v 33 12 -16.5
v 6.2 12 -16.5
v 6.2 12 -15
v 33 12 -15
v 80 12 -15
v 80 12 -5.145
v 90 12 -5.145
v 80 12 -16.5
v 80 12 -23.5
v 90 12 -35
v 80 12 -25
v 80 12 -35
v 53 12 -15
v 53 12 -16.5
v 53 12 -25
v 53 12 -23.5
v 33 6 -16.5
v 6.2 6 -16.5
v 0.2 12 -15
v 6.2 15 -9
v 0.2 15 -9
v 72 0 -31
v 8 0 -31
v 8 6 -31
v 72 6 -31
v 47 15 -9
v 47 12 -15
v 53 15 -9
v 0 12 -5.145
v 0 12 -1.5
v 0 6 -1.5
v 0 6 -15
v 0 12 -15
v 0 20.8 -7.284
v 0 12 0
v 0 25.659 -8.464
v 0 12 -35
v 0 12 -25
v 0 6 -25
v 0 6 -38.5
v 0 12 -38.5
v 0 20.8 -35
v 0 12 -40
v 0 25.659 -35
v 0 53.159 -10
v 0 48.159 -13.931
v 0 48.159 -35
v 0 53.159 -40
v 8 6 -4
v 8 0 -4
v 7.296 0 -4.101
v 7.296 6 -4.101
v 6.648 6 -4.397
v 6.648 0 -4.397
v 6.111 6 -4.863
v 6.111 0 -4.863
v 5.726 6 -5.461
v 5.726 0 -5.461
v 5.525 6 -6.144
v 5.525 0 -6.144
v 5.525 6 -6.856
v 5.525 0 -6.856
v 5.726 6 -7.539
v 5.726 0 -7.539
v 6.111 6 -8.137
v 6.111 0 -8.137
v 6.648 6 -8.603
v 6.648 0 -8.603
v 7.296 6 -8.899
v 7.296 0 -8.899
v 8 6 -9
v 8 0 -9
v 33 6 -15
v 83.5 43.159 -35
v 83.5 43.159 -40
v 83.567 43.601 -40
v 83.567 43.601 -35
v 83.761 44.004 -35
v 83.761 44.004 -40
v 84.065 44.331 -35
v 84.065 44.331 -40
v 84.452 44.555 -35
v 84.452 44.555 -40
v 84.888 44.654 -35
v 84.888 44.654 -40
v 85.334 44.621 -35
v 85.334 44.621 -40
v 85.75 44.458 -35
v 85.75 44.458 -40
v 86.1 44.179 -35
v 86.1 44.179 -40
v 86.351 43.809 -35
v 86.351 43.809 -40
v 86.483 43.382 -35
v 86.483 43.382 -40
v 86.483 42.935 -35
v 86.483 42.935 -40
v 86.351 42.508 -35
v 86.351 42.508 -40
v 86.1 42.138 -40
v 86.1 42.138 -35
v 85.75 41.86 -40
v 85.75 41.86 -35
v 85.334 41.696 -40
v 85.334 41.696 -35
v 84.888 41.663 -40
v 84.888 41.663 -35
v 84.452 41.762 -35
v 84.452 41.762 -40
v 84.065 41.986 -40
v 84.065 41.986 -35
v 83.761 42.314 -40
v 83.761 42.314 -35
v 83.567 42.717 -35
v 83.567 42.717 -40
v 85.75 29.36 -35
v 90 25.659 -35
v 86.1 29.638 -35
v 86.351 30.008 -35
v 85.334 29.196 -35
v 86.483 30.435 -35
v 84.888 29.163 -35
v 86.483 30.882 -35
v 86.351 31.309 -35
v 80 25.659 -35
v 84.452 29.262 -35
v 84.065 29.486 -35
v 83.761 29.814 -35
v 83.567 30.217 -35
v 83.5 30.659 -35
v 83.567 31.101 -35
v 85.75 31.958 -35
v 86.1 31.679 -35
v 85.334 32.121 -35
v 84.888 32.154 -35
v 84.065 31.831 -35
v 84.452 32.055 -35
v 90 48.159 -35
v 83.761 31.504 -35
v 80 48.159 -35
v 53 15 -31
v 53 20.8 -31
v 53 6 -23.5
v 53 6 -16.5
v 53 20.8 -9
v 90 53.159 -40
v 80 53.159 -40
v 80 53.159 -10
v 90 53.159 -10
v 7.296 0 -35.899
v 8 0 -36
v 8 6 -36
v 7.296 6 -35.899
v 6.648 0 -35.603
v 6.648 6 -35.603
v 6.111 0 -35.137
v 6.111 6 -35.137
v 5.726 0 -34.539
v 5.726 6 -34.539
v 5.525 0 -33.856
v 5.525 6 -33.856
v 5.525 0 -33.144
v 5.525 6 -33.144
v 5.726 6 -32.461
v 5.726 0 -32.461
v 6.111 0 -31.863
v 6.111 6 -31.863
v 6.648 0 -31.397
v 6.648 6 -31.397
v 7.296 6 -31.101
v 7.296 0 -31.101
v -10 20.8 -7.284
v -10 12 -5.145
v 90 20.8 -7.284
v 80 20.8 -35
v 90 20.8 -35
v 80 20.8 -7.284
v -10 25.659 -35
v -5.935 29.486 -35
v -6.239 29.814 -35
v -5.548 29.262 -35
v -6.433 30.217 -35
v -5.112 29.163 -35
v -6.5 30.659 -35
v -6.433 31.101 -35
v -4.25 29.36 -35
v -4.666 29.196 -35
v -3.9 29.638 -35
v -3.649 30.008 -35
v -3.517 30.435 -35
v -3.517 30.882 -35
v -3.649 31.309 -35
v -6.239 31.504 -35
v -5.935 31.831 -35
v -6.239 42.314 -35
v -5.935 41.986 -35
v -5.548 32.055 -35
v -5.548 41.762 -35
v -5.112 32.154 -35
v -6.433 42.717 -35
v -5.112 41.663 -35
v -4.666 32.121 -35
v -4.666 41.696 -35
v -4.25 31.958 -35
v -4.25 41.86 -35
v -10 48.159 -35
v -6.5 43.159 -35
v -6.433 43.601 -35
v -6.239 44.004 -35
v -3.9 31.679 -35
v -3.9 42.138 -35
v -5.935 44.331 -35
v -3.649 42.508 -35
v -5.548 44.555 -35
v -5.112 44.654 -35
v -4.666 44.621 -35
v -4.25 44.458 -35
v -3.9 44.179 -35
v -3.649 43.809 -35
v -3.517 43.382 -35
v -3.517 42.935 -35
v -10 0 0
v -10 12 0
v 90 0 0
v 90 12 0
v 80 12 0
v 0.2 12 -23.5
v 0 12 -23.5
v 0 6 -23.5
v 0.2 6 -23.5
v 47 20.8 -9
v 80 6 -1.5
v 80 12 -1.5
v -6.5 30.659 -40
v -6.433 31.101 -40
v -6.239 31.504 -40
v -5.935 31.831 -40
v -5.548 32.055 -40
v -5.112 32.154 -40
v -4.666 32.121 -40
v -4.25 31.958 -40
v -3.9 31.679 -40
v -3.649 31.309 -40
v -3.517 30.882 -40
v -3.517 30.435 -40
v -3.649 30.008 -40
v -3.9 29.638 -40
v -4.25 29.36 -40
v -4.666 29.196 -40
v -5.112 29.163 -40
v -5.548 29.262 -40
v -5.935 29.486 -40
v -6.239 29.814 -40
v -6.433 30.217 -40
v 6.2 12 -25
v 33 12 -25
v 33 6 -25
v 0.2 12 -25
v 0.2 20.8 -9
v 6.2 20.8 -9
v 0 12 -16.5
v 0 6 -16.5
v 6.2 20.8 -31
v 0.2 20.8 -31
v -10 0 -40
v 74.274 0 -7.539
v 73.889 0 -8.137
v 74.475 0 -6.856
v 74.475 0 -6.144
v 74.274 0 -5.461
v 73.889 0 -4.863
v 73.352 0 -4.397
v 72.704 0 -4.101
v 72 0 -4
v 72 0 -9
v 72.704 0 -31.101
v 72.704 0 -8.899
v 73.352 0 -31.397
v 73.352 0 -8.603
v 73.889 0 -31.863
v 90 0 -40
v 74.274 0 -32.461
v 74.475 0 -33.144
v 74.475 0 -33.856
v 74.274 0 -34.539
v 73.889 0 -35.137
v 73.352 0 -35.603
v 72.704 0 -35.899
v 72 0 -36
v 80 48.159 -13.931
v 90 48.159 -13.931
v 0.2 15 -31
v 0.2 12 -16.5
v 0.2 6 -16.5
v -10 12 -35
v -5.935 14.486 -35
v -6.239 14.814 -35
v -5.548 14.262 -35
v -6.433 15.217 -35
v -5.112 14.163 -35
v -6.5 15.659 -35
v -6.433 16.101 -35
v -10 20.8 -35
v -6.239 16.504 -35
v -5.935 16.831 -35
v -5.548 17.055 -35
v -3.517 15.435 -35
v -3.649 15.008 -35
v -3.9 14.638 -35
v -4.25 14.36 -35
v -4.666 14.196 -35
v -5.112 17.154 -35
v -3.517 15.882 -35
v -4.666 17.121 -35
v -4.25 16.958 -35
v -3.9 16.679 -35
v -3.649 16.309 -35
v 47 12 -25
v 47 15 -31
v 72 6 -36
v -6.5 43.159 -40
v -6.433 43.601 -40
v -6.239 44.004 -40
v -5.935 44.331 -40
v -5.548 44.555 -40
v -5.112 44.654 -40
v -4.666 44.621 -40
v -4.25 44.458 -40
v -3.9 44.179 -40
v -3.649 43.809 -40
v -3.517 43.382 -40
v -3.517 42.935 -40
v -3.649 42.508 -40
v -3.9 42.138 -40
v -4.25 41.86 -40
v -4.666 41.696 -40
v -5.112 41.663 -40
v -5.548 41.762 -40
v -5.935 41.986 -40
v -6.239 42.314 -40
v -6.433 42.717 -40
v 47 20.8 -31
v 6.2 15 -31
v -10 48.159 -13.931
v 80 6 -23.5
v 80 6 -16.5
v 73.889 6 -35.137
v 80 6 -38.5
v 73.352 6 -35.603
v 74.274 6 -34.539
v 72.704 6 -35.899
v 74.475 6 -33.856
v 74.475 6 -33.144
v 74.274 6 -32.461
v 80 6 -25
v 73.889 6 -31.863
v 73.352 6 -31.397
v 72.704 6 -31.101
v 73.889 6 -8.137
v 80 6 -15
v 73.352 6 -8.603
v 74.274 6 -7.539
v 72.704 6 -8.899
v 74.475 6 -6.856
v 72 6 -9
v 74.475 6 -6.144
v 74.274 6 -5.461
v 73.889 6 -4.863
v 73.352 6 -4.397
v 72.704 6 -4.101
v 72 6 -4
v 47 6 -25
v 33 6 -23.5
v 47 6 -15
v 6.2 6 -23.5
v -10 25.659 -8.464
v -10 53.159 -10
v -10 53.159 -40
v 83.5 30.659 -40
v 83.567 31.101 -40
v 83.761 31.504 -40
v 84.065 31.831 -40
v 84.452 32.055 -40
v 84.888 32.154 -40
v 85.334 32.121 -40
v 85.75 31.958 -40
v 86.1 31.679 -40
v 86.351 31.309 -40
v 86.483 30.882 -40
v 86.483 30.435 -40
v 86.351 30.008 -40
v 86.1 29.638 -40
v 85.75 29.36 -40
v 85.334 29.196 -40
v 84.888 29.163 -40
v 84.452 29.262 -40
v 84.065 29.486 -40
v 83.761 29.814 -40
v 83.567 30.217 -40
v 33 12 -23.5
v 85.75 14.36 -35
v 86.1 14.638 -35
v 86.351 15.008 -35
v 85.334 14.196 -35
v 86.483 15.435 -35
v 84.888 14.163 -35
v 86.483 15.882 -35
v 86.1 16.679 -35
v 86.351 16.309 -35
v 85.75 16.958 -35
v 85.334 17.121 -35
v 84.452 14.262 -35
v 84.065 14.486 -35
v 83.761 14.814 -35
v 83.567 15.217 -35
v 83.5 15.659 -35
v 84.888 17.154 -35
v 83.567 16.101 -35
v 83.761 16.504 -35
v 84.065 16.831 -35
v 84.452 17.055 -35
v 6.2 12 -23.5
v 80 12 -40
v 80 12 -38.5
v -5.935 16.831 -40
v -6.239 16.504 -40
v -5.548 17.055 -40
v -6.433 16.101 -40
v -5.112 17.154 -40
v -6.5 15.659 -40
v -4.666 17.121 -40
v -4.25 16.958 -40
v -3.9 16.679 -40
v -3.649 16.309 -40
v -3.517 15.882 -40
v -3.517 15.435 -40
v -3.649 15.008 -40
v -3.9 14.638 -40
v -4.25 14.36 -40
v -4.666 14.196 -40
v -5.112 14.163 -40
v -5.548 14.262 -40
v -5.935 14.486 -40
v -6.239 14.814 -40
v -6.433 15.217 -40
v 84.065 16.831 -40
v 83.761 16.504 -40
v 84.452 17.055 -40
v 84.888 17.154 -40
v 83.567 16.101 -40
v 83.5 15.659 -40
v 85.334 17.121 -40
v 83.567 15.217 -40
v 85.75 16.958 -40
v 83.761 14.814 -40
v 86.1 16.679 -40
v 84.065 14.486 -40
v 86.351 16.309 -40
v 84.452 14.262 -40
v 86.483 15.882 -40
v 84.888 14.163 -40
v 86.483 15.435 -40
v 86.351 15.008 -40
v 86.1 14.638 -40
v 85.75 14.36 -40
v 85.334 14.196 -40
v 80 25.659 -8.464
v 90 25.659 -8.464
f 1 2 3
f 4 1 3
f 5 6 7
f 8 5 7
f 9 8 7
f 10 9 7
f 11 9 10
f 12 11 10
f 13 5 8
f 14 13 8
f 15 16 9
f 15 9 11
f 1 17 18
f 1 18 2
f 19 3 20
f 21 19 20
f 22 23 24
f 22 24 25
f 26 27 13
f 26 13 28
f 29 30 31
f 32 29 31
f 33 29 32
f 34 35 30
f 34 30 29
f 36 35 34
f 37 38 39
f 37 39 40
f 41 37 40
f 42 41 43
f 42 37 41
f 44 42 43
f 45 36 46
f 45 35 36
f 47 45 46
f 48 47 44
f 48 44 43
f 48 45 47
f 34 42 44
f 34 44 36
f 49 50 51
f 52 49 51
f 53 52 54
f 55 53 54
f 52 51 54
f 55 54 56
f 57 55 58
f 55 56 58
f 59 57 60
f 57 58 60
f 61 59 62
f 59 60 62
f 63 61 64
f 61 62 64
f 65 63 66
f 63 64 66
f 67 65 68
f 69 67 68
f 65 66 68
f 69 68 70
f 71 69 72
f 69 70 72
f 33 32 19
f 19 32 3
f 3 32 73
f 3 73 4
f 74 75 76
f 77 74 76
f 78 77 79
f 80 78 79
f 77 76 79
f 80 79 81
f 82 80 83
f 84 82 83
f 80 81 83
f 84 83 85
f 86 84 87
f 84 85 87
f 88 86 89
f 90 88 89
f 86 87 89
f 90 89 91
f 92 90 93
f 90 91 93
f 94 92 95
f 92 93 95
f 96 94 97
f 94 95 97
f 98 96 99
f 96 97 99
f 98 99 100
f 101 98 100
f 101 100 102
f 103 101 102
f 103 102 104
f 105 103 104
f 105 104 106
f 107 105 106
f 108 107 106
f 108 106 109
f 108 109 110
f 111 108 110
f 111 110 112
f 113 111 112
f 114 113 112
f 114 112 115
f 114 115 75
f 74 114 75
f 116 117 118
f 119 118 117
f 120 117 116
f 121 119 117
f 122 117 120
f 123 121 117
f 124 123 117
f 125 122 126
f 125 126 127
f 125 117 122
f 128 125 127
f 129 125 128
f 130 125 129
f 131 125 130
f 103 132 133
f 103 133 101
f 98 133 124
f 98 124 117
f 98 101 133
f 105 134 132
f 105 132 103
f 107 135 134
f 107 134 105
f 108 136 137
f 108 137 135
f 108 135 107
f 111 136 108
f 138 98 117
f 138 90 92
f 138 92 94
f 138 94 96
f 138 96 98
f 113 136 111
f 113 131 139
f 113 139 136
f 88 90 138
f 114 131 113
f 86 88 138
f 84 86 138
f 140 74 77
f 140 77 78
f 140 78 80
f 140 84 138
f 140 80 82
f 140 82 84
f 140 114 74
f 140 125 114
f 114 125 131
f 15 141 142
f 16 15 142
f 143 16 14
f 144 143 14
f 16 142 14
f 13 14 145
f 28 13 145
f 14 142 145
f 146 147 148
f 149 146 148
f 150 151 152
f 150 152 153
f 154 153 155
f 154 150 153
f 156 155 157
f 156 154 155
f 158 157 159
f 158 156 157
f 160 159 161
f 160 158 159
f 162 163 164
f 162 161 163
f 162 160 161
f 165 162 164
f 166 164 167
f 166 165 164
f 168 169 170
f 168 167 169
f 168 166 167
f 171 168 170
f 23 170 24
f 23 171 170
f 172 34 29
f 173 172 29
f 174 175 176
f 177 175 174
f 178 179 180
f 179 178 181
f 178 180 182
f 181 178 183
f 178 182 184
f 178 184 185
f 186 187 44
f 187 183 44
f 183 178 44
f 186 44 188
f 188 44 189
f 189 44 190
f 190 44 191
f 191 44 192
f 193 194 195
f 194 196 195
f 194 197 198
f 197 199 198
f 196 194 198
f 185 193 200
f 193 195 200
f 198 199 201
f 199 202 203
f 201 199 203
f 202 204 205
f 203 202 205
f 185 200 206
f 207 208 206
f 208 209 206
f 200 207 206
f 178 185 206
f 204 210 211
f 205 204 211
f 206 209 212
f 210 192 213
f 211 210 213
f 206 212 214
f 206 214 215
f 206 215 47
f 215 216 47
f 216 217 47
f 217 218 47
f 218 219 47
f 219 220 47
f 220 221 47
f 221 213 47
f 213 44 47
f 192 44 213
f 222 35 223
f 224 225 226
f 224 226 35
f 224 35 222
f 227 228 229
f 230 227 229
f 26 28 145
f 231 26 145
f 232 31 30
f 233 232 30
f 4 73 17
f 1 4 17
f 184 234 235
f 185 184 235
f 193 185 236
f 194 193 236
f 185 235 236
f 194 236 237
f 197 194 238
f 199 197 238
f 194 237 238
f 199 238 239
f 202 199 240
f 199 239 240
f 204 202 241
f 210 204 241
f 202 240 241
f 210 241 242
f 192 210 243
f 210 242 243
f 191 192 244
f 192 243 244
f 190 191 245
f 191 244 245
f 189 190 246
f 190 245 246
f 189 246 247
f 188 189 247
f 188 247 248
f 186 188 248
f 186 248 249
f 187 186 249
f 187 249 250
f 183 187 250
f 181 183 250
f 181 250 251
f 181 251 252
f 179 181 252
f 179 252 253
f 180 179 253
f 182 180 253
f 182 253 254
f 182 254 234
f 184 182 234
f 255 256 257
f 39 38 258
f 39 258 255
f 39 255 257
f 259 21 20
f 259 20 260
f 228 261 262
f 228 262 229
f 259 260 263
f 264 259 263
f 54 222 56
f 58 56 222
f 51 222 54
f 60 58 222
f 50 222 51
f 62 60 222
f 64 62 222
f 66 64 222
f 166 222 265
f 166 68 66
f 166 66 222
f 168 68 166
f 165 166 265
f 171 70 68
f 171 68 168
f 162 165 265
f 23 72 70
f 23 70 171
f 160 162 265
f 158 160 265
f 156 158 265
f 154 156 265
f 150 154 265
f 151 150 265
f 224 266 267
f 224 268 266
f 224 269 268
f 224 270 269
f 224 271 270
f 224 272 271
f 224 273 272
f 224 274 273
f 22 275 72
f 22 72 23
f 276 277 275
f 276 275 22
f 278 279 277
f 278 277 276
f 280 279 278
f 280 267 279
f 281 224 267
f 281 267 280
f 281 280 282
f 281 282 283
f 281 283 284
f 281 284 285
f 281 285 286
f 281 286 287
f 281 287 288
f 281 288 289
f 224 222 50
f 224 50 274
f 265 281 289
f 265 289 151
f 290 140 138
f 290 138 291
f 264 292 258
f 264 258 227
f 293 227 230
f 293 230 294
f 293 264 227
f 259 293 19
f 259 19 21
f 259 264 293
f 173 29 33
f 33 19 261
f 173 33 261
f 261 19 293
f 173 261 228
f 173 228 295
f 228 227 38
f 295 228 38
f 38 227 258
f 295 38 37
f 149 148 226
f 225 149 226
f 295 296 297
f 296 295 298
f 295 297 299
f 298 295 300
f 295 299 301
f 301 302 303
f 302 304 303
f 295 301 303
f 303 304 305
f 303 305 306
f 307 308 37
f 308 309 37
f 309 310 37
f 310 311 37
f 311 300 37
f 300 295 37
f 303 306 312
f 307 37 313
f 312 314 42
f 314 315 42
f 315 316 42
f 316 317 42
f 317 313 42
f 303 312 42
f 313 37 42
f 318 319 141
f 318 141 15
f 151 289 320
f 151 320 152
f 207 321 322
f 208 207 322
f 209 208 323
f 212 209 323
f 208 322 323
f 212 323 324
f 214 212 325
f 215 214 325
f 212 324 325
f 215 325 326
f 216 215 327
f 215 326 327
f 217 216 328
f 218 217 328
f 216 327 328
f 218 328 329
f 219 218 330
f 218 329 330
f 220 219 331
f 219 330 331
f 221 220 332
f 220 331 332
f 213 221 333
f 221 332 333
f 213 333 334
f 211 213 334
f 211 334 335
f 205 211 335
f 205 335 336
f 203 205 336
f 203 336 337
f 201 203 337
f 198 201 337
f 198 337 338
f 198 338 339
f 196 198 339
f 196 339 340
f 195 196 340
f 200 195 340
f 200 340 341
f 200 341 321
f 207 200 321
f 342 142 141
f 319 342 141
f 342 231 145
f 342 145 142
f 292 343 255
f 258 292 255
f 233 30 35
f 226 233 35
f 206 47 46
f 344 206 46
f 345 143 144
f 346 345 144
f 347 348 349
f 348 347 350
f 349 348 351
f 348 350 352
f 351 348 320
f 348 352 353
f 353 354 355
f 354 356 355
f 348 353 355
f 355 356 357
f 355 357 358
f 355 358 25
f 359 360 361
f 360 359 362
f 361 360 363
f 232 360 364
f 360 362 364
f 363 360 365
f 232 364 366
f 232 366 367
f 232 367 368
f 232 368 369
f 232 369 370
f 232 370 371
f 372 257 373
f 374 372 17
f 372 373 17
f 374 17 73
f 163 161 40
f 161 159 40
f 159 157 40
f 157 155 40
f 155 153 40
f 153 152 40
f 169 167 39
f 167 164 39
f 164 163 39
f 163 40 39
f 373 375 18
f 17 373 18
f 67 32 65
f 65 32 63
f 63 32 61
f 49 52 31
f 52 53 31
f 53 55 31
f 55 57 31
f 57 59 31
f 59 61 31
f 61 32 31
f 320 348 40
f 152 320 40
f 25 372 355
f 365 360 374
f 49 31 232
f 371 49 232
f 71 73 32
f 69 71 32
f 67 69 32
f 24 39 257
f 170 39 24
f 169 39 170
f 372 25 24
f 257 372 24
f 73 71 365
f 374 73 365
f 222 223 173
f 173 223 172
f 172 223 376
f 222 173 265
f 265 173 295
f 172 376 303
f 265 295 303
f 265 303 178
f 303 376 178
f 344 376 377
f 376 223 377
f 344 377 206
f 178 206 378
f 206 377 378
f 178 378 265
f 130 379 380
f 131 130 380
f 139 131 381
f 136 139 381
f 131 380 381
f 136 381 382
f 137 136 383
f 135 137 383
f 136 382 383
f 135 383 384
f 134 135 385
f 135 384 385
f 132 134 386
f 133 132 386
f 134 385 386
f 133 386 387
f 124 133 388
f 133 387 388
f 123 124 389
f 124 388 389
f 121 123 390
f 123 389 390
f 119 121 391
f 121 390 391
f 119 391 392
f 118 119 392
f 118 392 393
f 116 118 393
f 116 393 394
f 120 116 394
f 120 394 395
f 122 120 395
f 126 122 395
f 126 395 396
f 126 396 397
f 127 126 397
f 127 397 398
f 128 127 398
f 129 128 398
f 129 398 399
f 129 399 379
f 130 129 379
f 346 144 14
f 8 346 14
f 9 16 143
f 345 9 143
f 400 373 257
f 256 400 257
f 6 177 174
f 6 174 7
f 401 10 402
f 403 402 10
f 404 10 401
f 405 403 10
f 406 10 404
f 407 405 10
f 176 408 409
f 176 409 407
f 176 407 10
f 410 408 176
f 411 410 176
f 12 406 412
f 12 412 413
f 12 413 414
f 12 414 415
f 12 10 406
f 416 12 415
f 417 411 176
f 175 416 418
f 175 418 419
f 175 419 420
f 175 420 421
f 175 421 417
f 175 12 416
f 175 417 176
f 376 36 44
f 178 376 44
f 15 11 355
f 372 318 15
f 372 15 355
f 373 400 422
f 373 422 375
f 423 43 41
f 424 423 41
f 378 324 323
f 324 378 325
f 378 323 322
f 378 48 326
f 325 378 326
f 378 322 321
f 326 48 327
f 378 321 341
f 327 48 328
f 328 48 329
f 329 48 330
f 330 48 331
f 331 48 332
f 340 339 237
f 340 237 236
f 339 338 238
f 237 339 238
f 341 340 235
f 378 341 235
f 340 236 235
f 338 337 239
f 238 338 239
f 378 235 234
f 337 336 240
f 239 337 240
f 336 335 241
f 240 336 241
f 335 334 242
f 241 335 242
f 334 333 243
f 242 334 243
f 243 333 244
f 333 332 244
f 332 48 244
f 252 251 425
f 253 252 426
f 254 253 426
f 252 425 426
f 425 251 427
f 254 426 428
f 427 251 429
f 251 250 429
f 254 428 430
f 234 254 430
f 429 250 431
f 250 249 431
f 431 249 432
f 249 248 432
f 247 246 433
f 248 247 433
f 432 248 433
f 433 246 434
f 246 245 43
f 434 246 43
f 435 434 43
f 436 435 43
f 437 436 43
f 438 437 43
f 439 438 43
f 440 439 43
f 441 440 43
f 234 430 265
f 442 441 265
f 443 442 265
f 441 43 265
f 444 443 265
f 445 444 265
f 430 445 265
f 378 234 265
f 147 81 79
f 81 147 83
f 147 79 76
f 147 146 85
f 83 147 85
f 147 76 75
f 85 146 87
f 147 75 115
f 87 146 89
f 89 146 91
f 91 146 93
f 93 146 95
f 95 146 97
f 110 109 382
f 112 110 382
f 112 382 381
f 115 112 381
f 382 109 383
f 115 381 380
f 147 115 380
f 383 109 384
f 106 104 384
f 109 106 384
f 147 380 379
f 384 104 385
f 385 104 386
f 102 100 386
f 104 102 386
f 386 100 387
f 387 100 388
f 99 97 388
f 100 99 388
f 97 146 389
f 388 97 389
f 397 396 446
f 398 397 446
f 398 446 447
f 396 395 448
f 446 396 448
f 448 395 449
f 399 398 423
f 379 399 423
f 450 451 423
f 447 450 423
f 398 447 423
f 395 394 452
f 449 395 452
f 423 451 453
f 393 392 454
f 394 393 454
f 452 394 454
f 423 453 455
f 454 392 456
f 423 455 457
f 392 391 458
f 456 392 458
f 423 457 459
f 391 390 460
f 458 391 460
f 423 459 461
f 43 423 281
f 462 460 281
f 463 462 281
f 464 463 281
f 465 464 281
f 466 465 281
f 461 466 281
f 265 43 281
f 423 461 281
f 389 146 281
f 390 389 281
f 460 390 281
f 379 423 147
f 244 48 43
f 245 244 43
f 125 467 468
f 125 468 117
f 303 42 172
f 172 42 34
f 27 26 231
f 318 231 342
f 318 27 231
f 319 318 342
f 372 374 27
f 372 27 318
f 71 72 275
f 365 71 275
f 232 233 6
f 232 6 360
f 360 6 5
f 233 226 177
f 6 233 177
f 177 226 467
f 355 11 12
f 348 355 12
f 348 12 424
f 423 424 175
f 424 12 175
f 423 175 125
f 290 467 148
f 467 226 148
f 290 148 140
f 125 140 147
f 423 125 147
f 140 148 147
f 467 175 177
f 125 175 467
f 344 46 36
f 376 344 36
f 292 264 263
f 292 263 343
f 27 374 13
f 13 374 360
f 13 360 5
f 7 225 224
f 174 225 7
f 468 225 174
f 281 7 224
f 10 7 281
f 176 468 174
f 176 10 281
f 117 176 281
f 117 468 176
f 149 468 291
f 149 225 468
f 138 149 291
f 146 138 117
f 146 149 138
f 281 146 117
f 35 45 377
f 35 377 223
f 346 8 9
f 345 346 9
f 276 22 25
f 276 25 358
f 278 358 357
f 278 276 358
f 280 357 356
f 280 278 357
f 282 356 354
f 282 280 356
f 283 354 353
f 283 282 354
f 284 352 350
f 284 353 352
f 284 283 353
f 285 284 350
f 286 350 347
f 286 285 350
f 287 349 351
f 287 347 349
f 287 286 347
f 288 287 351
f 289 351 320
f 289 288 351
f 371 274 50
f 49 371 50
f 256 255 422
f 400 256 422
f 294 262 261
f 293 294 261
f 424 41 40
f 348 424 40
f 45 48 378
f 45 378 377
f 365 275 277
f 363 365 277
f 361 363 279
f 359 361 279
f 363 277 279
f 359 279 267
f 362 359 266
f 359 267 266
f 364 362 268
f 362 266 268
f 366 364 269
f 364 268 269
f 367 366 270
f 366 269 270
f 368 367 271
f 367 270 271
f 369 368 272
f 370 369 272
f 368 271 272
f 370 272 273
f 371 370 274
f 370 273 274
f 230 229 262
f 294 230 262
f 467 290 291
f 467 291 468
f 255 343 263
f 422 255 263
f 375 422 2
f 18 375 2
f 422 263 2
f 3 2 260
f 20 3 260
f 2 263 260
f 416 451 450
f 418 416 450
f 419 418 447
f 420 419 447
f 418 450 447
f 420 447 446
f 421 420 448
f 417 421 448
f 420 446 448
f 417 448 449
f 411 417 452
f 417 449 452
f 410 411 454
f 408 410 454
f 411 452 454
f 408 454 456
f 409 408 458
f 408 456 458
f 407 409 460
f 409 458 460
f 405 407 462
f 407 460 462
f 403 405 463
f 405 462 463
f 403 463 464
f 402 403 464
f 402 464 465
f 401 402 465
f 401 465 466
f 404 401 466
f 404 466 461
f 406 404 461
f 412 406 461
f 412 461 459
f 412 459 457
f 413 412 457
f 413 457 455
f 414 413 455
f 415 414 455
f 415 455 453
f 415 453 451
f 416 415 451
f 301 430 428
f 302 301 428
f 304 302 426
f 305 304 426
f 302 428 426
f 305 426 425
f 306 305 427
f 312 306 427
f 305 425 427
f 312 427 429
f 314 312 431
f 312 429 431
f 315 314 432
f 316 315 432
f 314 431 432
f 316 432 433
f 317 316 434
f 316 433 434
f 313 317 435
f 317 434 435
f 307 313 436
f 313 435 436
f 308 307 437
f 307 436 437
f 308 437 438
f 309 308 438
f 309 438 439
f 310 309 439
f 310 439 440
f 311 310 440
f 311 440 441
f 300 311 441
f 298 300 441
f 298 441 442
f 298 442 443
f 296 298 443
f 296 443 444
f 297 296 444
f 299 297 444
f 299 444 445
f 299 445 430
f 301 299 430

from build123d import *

# Parameters (mm, degrees)
BOSS_EXTRUDE1_DEPTH  = 80
BOSS_EXTRUDE2_DEPTH  = 6
BOSS_EXTRUDE3_DEPTH  = 6
CUT_EXTRUDE1_REACH   = 93.829
SKETCH6_W            = 14
SKETCH6_H            = 10
CUT_EXTRUDE2_DEPTH   = 6
BOSS_EXTRUDE4_DEPTH  = 10
BOSS_EXTRUDE11_DEPTH = 10
CUT_EXTRUDE3_REACH   = 113.919
SKETCH9_R            = 1.5


with BuildPart() as part:
    # Sketch1 → Boss-Extrude1 (new body)
    with BuildSketch(Plane(origin=(0, 0, 0), x_dir=(0, 0, -1), z_dir=(1, 0, 0))):
        Polygon((0, 0), (40, 0), (40, 12), (38.5, 12), (38.5, 6), (25, 6), (25, 12), (23.5, 12), (23.5, 6), (16.5, 6), (16.5, 12), (15, 12), (15, 6), (1.5, 6), (1.5, 12), (0, 12), align=None)
    extrude(amount=BOSS_EXTRUDE1_DEPTH)

    # Sketch2 → Boss-Extrude2 (add)
    with BuildSketch(Plane(origin=(6.2, 0, 0), x_dir=(0, 0, -1), z_dir=(1, 0, 0))):
        Polygon((15, 6), (15, 12), (9, 15), (9, 20.8), (31, 20.8), (31, 15), (25, 12), (25, 6), align=None)
    extrude(amount=-BOSS_EXTRUDE2_DEPTH)

    # Sketch4 → Boss-Extrude3 (add)
    with BuildSketch(Plane(origin=(47, 0, 0), x_dir=(0, 0, -1), z_dir=(1, 0, 0))):
        Polygon((25, 6), (15, 6), (15, 12), (9, 15), (9, 20.8), (31, 20.8), (31, 15), (25, 12), align=None)
    extrude(amount=BOSS_EXTRUDE3_DEPTH)

    # Sketch5 → Cut-Extrude1 (cut, up to next)
    with BuildSketch(Plane.XZ, mode=Mode.PRIVATE) as cut_extrude1_sk1:
        with BuildLine():
            Line((8, -31), (72, -31))
            ThreePointArc((72, -31), (74.5, -33.5), (72, -36))
            Line((72, -36), (8, -36))
            ThreePointArc((8, -36), (5.5, -33.5), (8, -31))
        make_face()
    cut_extrude1_tool1 = extrude(cut_extrude1_sk1.sketch, amount=-CUT_EXTRUDE1_REACH, mode=Mode.PRIVATE) & part.part
    # Sketch5 → Cut-Extrude1 (cut, up to next)
    with BuildSketch(Plane.XZ, mode=Mode.PRIVATE) as cut_extrude1_sk2:
        with BuildLine():
            Line((72, -4), (8, -4))
            ThreePointArc((8, -4), (5.5, -6.5), (8, -9))
            Line((8, -9), (72, -9))
            ThreePointArc((72, -9), (74.5, -6.5), (72, -4))
        make_face()
    cut_extrude1_tool2 = extrude(cut_extrude1_sk2.sketch, amount=-CUT_EXTRUDE1_REACH, mode=Mode.PRIVATE) & part.part
    add(cut_extrude1_tool1.solids().sort_by_distance((40, 0, -33.5))[0], mode=Mode.SUBTRACT)
    add(cut_extrude1_tool2.solids().sort_by_distance((40, 0, -6.5))[0], mode=Mode.SUBTRACT)

    # Sketch6 → Cut-Extrude2 (cut)
    with BuildSketch(Plane(origin=(0, 6, 0), x_dir=(1, 0, 0), z_dir=(0, 1, 0))):
        with Locations((40, 20)):
            Rectangle(SKETCH6_W, SKETCH6_H)
    extrude(amount=CUT_EXTRUDE2_DEPTH, mode=Mode.SUBTRACT)

    # Sketch7 → Boss-Extrude4 (add)
    with BuildSketch(Plane(origin=(80, 0, 0), x_dir=(0, 0, -1), z_dir=(1, 0, 0))):
        Polygon((0, 0), (40, 0), (40, 12), (40, 53.158651342), (10, 53.158651342), (0, 12), align=None)
        Polygon((35, 48.158651342), (13.930649368, 48.158651342), (8.463997944, 25.658651342), (35, 25.658651342), align=None, mode=Mode.SUBTRACT)
        Polygon((35, 20.8), (7.283528909, 20.8), (5.145460796, 12), (35, 12), align=None, mode=Mode.SUBTRACT)
    extrude(amount=BOSS_EXTRUDE4_DEPTH)

    # Sketch8 → Boss-Extrude11 (add)
    with BuildSketch(Plane.ZY):
        Polygon((0, 12), (0, 0), (-40, 0), (-40, 12), (-40, 53.158651342), (-10, 53.158651342), align=None)
        Polygon((-5.145460796, 12), (-35, 12), (-35, 20.8), (-7.283528909, 20.8), align=None, mode=Mode.SUBTRACT)
        Polygon((-13.930649368, 48.158651342), (-8.463997944, 25.658651342), (-35, 25.658651342), (-35, 48.158651342), align=None, mode=Mode.SUBTRACT)
    extrude(amount=BOSS_EXTRUDE11_DEPTH)

    # Sketch9 → Cut-Extrude3 (cut, up to next)
    with BuildSketch(Plane(origin=(0, 0, -40), x_dir=(-1, 0, 0), z_dir=(0, 0, -1)), mode=Mode.PRIVATE) as cut_extrude3_sk1:
        with Locations((-85, 43.158651342)):
            Circle(SKETCH9_R)
    cut_extrude3_tool1 = extrude(cut_extrude3_sk1.sketch, amount=-CUT_EXTRUDE3_REACH, mode=Mode.PRIVATE) & part.part
    # Sketch9 → Cut-Extrude3 (cut, up to next)
    with BuildSketch(Plane(origin=(0, 0, -40), x_dir=(-1, 0, 0), z_dir=(0, 0, -1)), mode=Mode.PRIVATE) as cut_extrude3_sk2:
        with Locations((-85, 30.658651342)):
            Circle(SKETCH9_R)
    cut_extrude3_tool2 = extrude(cut_extrude3_sk2.sketch, amount=-CUT_EXTRUDE3_REACH, mode=Mode.PRIVATE) & part.part
    # Sketch9 → Cut-Extrude3 (cut, up to next)
    with BuildSketch(Plane(origin=(0, 0, -40), x_dir=(-1, 0, 0), z_dir=(0, 0, -1)), mode=Mode.PRIVATE) as cut_extrude3_sk3:
        with Locations((-85, 15.658651342)):
            Circle(SKETCH9_R)
    cut_extrude3_tool3 = extrude(cut_extrude3_sk3.sketch, amount=-CUT_EXTRUDE3_REACH, mode=Mode.PRIVATE) & part.part
    # Sketch9 → Cut-Extrude3 (cut, up to next)
    with BuildSketch(Plane(origin=(0, 0, -40), x_dir=(-1, 0, 0), z_dir=(0, 0, -1)), mode=Mode.PRIVATE) as cut_extrude3_sk4:
        with Locations((5, 43.158651342)):
            Circle(SKETCH9_R)
    cut_extrude3_tool4 = extrude(cut_extrude3_sk4.sketch, amount=-CUT_EXTRUDE3_REACH, mode=Mode.PRIVATE) & part.part
    # Sketch9 → Cut-Extrude3 (cut, up to next)
    with BuildSketch(Plane(origin=(0, 0, -40), x_dir=(-1, 0, 0), z_dir=(0, 0, -1)), mode=Mode.PRIVATE) as cut_extrude3_sk5:
        with Locations((5, 30.658651342)):
            Circle(SKETCH9_R)
    cut_extrude3_tool5 = extrude(cut_extrude3_sk5.sketch, amount=-CUT_EXTRUDE3_REACH, mode=Mode.PRIVATE) & part.part
    # Sketch9 → Cut-Extrude3 (cut, up to next)
    with BuildSketch(Plane(origin=(0, 0, -40), x_dir=(-1, 0, 0), z_dir=(0, 0, -1)), mode=Mode.PRIVATE) as cut_extrude3_sk6:
        with Locations((5, 15.658651342)):
            Circle(SKETCH9_R)
    cut_extrude3_tool6 = extrude(cut_extrude3_sk6.sketch, amount=-CUT_EXTRUDE3_REACH, mode=Mode.PRIVATE) & part.part
    add(cut_extrude3_tool1.solids().sort_by_distance((85, 43.158651, -40))[0], mode=Mode.SUBTRACT)
    add(cut_extrude3_tool2.solids().sort_by_distance((85, 30.658651, -40))[0], mode=Mode.SUBTRACT)
    add(cut_extrude3_tool3.solids().sort_by_distance((85, 15.658651, -40))[0], mode=Mode.SUBTRACT)
    add(cut_extrude3_tool4.solids().sort_by_distance((-5, 43.158651, -40))[0], mode=Mode.SUBTRACT)
    add(cut_extrude3_tool5.solids().sort_by_distance((-5, 30.658651, -40))[0], mode=Mode.SUBTRACT)
    add(cut_extrude3_tool6.solids().sort_by_distance((-5, 15.658651, -40))[0], mode=Mode.SUBTRACT)


solid = part.part
